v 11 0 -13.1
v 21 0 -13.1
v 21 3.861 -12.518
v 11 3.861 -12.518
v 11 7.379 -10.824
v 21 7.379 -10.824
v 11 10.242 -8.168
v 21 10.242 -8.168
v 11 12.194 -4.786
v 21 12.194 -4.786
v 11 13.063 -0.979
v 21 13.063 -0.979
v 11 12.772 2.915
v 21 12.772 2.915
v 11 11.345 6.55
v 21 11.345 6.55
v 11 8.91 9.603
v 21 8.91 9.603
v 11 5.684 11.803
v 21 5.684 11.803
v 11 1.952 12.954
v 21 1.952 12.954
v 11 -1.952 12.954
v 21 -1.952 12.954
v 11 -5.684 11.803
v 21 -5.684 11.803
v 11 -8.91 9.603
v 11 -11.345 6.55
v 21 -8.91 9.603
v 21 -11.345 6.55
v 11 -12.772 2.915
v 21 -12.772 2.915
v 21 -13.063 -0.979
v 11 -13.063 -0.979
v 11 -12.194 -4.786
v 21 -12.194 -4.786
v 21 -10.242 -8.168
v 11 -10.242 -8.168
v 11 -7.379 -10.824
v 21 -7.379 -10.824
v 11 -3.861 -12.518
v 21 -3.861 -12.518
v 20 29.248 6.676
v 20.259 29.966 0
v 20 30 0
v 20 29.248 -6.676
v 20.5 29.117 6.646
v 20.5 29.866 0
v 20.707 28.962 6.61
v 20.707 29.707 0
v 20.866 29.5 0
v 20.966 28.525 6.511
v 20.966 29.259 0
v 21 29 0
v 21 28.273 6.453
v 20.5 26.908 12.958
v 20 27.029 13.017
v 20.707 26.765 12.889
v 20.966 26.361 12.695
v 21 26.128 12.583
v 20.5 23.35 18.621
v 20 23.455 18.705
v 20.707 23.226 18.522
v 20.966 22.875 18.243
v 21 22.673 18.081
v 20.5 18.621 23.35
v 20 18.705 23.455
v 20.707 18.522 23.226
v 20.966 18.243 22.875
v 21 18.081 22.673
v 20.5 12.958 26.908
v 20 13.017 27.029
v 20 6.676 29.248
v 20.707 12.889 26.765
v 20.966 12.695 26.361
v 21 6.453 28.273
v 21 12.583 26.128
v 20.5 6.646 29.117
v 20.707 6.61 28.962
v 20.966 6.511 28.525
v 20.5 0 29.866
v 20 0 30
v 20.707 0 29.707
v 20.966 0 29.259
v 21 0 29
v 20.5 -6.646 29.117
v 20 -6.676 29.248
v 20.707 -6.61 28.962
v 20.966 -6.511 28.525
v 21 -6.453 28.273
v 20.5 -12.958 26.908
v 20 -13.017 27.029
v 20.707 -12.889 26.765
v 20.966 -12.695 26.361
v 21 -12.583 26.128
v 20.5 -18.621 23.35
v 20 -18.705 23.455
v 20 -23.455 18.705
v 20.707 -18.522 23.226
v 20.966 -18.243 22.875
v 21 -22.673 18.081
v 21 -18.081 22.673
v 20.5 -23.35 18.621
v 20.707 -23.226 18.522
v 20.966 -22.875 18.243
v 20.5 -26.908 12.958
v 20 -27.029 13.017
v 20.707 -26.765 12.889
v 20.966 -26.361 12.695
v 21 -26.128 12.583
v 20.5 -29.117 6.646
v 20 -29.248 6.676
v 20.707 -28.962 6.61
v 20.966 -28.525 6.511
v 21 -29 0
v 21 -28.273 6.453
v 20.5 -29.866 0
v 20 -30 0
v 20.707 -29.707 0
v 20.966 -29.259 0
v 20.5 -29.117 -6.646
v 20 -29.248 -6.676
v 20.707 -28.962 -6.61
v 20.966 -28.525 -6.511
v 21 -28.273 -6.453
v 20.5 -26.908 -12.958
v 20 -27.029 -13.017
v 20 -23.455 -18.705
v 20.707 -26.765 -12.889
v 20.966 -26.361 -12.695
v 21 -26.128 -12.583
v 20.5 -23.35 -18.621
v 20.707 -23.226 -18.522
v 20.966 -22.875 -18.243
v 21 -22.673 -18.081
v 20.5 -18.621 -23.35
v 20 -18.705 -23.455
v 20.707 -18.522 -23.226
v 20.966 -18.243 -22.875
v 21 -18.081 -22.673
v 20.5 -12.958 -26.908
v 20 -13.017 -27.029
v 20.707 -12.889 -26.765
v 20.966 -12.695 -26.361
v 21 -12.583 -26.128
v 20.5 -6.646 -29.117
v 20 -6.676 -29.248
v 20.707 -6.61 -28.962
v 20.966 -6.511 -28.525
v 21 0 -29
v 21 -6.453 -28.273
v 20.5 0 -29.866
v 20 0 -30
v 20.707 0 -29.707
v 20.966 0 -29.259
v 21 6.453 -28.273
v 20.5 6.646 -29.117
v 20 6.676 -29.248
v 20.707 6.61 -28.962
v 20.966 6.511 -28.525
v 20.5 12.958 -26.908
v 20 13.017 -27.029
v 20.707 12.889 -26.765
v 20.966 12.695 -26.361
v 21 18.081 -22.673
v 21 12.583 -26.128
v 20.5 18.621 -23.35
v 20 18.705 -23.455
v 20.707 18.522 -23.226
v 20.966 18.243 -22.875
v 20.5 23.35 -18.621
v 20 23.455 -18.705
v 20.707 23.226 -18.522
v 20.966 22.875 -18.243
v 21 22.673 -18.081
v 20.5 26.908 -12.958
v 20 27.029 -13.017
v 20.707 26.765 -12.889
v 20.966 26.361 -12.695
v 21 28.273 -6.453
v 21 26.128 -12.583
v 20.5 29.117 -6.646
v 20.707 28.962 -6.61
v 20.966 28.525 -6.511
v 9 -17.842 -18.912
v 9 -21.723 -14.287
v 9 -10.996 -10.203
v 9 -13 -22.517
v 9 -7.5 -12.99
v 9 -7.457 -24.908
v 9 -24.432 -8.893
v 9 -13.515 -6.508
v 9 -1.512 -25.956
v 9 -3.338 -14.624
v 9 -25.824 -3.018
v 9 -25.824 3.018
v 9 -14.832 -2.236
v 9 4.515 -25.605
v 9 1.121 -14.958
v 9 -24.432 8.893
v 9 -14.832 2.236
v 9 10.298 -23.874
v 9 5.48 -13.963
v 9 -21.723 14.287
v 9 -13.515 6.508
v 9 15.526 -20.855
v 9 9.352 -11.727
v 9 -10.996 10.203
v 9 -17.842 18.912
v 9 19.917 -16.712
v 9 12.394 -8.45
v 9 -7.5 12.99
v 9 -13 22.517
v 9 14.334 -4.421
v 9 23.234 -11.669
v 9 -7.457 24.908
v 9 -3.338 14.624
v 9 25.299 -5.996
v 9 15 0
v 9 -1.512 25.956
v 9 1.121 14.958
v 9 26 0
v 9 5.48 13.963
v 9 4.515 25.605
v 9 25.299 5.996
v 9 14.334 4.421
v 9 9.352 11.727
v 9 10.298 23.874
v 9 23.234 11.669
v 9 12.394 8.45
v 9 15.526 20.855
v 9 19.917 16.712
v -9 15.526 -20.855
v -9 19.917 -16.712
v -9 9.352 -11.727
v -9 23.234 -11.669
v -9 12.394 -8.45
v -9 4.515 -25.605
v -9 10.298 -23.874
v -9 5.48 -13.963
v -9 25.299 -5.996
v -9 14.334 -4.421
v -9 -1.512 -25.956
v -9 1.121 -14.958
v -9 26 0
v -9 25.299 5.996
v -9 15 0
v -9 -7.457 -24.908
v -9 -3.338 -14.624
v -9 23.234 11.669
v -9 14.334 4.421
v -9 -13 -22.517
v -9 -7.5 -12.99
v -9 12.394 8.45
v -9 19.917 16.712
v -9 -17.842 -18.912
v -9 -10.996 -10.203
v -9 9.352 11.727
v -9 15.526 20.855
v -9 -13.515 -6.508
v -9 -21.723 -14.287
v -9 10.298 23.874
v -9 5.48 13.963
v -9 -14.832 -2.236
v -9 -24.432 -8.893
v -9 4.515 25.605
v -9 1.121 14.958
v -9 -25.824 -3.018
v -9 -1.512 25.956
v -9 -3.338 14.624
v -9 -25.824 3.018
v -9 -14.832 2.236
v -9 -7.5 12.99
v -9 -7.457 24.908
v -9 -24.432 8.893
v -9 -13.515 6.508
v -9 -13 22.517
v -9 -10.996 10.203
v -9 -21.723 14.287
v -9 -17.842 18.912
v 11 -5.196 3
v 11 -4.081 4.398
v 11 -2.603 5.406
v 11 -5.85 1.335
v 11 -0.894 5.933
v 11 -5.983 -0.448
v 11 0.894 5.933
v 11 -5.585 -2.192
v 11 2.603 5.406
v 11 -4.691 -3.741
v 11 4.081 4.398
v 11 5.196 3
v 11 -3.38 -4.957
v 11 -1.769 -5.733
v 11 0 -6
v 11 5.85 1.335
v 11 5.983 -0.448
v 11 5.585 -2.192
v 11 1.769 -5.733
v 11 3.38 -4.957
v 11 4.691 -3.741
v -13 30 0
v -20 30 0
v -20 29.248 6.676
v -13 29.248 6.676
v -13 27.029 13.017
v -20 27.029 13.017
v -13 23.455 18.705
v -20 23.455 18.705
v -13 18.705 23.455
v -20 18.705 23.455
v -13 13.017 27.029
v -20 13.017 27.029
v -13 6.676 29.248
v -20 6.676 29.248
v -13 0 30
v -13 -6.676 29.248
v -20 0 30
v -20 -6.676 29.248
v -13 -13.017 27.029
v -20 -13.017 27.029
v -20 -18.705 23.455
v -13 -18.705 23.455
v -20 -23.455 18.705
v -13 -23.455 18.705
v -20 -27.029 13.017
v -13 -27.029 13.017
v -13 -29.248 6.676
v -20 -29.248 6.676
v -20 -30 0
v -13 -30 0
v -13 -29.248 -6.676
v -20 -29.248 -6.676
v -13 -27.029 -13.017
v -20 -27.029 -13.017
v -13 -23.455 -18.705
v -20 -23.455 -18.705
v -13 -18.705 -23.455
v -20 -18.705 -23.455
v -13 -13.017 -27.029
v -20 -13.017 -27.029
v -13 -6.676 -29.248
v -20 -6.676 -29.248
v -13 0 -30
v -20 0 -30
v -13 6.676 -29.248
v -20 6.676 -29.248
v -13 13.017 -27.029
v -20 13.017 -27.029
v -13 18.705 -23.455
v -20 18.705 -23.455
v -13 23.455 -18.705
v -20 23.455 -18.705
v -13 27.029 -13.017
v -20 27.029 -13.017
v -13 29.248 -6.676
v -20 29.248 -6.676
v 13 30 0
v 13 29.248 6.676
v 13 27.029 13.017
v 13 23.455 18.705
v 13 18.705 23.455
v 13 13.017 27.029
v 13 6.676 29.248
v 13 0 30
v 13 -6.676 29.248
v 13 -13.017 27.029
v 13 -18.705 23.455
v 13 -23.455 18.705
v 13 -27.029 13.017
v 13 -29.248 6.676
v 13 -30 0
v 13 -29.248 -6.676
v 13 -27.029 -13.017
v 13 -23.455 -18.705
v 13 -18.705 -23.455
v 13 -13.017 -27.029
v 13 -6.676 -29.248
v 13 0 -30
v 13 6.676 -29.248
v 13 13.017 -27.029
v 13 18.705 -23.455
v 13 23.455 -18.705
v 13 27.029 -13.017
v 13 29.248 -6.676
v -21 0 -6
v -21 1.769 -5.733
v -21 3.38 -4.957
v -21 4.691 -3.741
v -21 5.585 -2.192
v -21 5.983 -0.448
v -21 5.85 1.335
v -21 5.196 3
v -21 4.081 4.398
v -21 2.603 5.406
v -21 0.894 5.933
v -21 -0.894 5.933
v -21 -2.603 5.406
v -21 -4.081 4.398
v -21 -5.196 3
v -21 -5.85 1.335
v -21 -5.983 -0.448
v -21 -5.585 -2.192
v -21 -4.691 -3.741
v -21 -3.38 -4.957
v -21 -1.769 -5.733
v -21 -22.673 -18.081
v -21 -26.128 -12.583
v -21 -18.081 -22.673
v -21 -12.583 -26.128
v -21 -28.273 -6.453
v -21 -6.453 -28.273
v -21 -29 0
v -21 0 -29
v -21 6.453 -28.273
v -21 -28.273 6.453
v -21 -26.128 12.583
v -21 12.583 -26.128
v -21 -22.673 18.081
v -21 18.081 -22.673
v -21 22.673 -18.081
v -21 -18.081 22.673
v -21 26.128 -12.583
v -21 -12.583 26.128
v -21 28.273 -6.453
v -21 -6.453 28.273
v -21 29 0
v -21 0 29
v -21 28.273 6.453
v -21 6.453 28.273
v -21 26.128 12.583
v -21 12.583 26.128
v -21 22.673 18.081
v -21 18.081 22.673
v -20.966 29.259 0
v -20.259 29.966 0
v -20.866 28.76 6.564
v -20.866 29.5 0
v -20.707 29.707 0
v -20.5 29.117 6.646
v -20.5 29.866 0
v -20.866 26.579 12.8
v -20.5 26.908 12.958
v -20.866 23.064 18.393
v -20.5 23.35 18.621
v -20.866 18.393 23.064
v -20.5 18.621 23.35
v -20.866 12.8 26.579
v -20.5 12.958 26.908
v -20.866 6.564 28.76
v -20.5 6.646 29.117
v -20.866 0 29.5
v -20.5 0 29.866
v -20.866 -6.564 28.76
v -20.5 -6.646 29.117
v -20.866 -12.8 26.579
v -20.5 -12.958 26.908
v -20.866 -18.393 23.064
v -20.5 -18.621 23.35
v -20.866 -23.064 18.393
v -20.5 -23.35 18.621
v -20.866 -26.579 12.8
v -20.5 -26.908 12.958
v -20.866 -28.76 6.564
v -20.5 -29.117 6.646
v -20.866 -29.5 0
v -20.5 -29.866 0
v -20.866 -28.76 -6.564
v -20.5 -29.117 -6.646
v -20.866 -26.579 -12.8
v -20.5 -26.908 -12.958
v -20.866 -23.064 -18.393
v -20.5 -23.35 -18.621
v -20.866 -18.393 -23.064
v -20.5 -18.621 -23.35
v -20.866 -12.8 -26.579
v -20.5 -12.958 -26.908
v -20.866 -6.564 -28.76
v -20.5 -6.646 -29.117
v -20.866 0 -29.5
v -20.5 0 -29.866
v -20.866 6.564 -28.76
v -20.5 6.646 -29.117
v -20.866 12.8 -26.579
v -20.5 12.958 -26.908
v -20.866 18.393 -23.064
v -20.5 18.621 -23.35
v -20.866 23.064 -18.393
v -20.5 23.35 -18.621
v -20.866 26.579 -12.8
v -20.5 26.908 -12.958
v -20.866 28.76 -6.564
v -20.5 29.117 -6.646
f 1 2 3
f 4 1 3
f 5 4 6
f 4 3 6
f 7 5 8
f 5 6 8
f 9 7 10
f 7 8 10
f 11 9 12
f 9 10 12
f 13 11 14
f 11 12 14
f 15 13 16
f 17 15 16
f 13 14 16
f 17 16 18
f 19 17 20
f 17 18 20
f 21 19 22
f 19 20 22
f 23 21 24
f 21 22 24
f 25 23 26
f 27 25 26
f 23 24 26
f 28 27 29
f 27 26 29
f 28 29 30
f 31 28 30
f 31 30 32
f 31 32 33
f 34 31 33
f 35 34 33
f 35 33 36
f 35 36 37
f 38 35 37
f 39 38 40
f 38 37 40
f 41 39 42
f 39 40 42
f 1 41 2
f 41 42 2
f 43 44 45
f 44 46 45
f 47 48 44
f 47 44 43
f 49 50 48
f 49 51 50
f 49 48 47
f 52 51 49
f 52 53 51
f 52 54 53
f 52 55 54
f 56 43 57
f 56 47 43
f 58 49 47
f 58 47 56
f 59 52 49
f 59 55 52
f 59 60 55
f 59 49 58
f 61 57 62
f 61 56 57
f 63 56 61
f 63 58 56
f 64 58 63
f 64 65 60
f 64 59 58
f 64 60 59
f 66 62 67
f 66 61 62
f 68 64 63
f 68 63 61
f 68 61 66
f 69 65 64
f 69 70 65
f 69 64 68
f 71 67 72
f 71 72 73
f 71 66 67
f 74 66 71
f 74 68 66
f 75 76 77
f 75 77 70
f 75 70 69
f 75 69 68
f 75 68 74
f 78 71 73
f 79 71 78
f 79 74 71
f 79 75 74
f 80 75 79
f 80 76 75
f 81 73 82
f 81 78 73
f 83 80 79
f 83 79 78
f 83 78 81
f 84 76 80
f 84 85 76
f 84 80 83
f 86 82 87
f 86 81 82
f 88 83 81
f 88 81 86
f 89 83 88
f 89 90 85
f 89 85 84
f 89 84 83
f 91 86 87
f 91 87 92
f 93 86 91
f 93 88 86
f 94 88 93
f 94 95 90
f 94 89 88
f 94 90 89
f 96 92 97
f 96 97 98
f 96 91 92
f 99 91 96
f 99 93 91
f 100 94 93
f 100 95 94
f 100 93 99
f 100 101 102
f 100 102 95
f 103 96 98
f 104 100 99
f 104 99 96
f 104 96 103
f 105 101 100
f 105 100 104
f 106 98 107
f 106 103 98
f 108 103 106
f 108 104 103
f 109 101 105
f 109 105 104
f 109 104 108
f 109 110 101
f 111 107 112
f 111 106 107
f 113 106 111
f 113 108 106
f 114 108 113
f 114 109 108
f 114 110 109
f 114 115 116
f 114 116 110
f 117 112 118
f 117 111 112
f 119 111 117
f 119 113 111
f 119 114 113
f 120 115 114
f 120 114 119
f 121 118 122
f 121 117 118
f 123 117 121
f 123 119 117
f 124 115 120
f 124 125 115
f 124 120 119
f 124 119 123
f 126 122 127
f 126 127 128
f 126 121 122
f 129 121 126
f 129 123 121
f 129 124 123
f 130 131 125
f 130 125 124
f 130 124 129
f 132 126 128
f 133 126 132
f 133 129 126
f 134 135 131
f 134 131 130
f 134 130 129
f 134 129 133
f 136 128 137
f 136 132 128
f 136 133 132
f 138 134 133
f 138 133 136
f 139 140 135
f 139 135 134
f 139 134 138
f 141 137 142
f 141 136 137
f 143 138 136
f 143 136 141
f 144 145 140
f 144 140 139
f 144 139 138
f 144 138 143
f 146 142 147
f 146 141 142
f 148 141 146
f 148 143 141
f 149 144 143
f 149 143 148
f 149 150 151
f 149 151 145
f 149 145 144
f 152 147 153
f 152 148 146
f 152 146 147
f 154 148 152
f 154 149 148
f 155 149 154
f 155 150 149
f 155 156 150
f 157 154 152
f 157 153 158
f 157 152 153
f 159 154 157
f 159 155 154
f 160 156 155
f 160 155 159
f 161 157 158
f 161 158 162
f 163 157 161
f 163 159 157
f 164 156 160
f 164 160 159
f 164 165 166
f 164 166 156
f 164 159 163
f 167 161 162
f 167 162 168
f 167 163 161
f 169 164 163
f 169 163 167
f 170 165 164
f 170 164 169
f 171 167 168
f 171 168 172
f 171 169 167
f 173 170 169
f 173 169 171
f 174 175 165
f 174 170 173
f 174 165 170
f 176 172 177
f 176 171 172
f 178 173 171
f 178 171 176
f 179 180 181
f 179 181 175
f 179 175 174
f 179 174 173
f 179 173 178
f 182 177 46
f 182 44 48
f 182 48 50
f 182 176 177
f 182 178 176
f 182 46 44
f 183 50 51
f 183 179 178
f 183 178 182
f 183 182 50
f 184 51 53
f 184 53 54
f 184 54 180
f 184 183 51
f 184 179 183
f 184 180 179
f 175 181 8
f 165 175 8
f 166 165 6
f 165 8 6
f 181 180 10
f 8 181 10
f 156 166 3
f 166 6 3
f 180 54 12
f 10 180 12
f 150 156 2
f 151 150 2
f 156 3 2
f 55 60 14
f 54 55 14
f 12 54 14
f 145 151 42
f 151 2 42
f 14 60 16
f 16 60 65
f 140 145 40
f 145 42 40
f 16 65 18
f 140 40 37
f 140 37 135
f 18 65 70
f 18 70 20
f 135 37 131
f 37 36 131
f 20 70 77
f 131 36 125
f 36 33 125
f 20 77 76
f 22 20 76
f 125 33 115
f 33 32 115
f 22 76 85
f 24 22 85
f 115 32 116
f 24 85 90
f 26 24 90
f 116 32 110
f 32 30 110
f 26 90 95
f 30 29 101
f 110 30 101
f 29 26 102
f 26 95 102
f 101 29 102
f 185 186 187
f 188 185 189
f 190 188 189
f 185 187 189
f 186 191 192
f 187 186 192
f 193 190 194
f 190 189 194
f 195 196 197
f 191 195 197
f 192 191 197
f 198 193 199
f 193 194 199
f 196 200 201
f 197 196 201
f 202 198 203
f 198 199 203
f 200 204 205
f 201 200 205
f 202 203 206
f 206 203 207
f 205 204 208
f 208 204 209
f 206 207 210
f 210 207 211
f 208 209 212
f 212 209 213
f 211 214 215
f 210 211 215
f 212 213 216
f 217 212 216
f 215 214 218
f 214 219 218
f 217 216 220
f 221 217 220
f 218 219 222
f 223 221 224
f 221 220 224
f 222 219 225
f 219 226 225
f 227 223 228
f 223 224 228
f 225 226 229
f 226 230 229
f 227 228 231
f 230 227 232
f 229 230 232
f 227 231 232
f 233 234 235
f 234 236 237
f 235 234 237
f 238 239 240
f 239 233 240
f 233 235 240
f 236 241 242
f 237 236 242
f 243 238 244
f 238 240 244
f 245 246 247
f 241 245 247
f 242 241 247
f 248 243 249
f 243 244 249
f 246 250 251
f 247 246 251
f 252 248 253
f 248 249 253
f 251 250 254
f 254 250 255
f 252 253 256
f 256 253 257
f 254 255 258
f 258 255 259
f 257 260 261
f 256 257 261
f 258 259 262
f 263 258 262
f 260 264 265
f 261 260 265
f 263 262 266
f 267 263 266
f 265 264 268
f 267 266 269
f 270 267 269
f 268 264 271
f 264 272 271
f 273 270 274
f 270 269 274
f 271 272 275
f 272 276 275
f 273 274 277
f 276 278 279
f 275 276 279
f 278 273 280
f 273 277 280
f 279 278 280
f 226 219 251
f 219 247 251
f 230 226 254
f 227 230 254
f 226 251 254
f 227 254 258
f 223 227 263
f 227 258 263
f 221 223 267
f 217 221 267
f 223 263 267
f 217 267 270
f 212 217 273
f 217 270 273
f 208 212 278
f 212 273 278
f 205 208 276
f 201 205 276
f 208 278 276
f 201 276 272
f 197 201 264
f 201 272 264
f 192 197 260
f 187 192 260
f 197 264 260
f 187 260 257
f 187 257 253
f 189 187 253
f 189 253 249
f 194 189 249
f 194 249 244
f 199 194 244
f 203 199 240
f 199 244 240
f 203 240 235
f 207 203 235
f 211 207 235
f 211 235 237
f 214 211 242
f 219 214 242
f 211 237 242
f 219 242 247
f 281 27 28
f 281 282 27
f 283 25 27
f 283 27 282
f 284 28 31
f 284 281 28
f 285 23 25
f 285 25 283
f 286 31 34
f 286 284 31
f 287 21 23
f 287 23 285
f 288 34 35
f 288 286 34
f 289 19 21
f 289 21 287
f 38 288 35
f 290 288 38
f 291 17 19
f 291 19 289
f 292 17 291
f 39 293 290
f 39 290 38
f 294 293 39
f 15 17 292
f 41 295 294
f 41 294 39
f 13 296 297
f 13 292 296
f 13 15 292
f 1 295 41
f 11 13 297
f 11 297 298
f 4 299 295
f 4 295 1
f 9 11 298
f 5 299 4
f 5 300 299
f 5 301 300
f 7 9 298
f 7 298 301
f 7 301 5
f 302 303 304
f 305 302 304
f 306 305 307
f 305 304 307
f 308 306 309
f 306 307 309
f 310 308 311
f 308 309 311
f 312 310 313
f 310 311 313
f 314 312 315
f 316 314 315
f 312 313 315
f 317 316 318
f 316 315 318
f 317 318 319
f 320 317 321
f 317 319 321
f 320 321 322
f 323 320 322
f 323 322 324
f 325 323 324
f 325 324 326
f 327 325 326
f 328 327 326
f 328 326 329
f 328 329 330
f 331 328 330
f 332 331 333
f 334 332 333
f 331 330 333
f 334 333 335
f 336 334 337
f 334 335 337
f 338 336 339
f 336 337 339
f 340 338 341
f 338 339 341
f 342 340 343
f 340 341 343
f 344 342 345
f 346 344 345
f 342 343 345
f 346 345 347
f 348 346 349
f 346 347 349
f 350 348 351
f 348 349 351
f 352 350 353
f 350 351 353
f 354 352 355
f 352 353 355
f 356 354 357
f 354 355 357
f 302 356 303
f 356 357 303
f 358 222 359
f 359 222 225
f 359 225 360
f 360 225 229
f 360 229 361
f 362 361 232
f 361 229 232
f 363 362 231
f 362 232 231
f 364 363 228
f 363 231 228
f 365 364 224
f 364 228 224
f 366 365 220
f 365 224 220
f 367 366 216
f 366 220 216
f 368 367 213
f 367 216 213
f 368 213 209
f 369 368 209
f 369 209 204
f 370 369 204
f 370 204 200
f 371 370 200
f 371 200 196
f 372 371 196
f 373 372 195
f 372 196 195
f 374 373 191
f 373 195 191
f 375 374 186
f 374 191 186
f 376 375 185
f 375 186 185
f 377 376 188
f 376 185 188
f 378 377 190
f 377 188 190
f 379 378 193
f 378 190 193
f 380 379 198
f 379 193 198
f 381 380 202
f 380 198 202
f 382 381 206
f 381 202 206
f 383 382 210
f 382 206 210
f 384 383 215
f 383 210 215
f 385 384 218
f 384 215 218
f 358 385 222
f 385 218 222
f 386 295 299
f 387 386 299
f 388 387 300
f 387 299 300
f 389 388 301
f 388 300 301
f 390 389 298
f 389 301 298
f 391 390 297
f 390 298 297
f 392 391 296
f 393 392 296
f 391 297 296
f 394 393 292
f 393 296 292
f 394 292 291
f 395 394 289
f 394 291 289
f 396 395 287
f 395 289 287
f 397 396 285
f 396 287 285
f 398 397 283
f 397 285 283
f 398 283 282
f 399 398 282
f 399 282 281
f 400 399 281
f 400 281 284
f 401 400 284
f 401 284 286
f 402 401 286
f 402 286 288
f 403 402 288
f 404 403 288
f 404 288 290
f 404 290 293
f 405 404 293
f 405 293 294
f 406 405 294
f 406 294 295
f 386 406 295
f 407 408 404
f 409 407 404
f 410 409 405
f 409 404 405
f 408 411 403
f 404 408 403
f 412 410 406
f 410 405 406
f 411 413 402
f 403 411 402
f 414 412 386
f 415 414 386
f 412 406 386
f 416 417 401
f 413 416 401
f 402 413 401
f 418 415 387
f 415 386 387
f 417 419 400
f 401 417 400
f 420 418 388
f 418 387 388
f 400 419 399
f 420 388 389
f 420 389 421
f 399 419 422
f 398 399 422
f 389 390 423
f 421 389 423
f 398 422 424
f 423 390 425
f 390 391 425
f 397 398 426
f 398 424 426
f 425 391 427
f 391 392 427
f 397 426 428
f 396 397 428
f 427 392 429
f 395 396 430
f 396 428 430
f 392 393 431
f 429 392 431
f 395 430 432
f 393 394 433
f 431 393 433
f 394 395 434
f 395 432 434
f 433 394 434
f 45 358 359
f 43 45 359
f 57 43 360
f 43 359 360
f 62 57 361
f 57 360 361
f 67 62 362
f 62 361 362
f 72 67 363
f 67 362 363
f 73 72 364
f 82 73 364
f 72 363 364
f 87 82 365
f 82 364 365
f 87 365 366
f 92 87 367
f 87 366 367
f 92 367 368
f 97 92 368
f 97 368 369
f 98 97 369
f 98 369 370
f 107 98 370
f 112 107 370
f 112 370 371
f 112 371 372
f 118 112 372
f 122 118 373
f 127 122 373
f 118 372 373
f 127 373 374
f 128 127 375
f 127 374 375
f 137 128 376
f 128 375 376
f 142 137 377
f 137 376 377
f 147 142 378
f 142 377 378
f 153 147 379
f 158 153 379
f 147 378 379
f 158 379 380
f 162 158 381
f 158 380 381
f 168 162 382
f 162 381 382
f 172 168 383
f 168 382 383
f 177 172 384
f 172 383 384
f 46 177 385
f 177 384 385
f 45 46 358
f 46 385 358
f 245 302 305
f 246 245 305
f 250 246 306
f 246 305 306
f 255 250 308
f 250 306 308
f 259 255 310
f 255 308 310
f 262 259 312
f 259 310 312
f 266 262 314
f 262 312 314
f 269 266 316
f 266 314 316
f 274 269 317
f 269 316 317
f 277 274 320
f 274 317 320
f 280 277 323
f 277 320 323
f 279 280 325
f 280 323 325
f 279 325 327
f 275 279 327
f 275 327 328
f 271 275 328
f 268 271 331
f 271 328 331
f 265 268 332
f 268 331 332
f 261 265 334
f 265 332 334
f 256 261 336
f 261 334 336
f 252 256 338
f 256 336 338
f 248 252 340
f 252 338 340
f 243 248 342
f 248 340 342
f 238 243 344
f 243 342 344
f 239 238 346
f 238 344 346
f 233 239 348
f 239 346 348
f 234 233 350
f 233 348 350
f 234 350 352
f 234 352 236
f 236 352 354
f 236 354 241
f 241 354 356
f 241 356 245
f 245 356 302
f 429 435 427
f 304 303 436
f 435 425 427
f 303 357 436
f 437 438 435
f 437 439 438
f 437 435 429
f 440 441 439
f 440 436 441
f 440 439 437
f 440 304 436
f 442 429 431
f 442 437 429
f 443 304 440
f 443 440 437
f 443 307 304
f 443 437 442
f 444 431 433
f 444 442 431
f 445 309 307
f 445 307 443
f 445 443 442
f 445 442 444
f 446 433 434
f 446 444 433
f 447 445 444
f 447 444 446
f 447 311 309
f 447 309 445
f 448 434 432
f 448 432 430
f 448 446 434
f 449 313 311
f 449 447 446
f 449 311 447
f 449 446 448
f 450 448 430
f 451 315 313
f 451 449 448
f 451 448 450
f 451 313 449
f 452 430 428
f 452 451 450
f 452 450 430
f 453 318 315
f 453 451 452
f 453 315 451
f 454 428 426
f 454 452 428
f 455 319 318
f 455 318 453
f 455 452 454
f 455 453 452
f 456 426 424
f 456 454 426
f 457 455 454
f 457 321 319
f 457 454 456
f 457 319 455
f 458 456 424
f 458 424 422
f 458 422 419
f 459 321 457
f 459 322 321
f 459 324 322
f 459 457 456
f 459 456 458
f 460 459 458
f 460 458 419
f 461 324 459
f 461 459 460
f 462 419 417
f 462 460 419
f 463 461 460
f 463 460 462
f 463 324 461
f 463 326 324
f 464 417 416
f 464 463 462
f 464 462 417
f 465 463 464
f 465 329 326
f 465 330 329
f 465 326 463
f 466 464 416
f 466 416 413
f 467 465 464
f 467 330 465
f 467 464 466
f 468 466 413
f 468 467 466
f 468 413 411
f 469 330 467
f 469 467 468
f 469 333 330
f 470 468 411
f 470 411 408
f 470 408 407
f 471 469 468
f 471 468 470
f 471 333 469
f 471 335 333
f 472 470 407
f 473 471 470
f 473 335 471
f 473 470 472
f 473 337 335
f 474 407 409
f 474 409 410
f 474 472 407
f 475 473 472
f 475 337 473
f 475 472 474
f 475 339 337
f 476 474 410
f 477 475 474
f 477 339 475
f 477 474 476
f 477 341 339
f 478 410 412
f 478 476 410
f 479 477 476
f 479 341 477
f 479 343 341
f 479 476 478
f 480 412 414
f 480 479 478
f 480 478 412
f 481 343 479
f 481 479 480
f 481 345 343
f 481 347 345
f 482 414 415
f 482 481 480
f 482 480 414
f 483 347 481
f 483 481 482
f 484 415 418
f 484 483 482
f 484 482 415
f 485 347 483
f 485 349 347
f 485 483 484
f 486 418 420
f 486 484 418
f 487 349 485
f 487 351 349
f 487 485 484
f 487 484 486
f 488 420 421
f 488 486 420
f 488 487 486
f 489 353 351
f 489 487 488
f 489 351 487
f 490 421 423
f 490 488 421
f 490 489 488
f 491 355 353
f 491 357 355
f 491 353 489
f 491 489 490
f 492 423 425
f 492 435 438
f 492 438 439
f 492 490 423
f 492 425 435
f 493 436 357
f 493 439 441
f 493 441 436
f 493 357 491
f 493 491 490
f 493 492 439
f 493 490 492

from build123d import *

# Parameters (mm, degrees)
SKETCH2_R               = 9
BOSS_EXTRUDE1_DEPTH     = 10
SKETCH3_R               = 6
CUT_EXTRUDE1_DEPTH      = 53
CHAMFER1_SIZE           = 4
FILLET4_R               = 1
SKETCH8_W               = 10
SKETCH8_H               = 21.176663605
CUT_EXTRUDE3_DEPTH      = 31
CUT_EXTRUDE3_DEPTH_BACK = 31
SKETCH10_R              = 13.1
CUT_EXTRUDE4_DEPTH      = 10


with BuildPart() as part:
    # Sketch1 → Revolve1 (revolve)
    with BuildSketch(Plane.XY):
        Polygon((-21, 0), (21, 0), (21, 30), (9, 30), (9, 15), (-9, 15), (-9, 30), (-21, 30), align=None)
    revolve(axis=Axis((-21, 0, 0), (1, 0, 0)))

    # Sketch2 → Boss-Extrude1 (add)
    with BuildSketch(Plane(origin=(21, 0, 0), x_dir=(0, 0, -1), z_dir=(1, 0, 0))):
        Circle(SKETCH2_R)
    extrude(amount=BOSS_EXTRUDE1_DEPTH)

    # Sketch3 → Cut-Extrude1 (cut, through all)
    with BuildSketch(Plane(origin=(31, 0, 0), x_dir=(0, 0, -1), z_dir=(1, 0, 0))):
        Circle(SKETCH3_R)
    extrude(amount=-CUT_EXTRUDE1_DEPTH, mode=Mode.SUBTRACT)

    # Chamfer1
    chamfer1_edges = [part.edges().sort_by_distance(p)[0] for p in [
        (-9, -30, 0),
        (9, -30, 0),
    ]]
    chamfer(chamfer1_edges, length=CHAMFER1_SIZE)

    # Fillet4
    fillet4_edges = [part.edges().sort_by_distance(p)[0] for p in [
        (-21, -30, 0),
        (21, -30, 0),
    ]]
    fillet(fillet4_edges, radius=FILLET4_R)

    # Sketch8 → Cut-Extrude3 (cut, two sides)
    with BuildSketch(Plane(origin=(0, 0, 0), x_dir=(1, 0, 0), z_dir=(0, 1, 0))) as cut_extrude3_sk:
        with Locations((26, 0.476968454)):
            Rectangle(SKETCH8_W, SKETCH8_H)
    extrude(amount=CUT_EXTRUDE3_DEPTH, mode=Mode.SUBTRACT)
    extrude(cut_extrude3_sk.sketch, amount=-CUT_EXTRUDE3_DEPTH_BACK, mode=Mode.SUBTRACT)

    # Sketch10 → Cut-Extrude4 (cut)
    with BuildSketch(Plane(origin=(21, 0, 0), x_dir=(0, 0, -1), z_dir=(1, 0, 0))):
        Circle(SKETCH10_R)
    extrude(amount=-CUT_EXTRUDE4_DEPTH, mode=Mode.SUBTRACT)


solid = part.part
